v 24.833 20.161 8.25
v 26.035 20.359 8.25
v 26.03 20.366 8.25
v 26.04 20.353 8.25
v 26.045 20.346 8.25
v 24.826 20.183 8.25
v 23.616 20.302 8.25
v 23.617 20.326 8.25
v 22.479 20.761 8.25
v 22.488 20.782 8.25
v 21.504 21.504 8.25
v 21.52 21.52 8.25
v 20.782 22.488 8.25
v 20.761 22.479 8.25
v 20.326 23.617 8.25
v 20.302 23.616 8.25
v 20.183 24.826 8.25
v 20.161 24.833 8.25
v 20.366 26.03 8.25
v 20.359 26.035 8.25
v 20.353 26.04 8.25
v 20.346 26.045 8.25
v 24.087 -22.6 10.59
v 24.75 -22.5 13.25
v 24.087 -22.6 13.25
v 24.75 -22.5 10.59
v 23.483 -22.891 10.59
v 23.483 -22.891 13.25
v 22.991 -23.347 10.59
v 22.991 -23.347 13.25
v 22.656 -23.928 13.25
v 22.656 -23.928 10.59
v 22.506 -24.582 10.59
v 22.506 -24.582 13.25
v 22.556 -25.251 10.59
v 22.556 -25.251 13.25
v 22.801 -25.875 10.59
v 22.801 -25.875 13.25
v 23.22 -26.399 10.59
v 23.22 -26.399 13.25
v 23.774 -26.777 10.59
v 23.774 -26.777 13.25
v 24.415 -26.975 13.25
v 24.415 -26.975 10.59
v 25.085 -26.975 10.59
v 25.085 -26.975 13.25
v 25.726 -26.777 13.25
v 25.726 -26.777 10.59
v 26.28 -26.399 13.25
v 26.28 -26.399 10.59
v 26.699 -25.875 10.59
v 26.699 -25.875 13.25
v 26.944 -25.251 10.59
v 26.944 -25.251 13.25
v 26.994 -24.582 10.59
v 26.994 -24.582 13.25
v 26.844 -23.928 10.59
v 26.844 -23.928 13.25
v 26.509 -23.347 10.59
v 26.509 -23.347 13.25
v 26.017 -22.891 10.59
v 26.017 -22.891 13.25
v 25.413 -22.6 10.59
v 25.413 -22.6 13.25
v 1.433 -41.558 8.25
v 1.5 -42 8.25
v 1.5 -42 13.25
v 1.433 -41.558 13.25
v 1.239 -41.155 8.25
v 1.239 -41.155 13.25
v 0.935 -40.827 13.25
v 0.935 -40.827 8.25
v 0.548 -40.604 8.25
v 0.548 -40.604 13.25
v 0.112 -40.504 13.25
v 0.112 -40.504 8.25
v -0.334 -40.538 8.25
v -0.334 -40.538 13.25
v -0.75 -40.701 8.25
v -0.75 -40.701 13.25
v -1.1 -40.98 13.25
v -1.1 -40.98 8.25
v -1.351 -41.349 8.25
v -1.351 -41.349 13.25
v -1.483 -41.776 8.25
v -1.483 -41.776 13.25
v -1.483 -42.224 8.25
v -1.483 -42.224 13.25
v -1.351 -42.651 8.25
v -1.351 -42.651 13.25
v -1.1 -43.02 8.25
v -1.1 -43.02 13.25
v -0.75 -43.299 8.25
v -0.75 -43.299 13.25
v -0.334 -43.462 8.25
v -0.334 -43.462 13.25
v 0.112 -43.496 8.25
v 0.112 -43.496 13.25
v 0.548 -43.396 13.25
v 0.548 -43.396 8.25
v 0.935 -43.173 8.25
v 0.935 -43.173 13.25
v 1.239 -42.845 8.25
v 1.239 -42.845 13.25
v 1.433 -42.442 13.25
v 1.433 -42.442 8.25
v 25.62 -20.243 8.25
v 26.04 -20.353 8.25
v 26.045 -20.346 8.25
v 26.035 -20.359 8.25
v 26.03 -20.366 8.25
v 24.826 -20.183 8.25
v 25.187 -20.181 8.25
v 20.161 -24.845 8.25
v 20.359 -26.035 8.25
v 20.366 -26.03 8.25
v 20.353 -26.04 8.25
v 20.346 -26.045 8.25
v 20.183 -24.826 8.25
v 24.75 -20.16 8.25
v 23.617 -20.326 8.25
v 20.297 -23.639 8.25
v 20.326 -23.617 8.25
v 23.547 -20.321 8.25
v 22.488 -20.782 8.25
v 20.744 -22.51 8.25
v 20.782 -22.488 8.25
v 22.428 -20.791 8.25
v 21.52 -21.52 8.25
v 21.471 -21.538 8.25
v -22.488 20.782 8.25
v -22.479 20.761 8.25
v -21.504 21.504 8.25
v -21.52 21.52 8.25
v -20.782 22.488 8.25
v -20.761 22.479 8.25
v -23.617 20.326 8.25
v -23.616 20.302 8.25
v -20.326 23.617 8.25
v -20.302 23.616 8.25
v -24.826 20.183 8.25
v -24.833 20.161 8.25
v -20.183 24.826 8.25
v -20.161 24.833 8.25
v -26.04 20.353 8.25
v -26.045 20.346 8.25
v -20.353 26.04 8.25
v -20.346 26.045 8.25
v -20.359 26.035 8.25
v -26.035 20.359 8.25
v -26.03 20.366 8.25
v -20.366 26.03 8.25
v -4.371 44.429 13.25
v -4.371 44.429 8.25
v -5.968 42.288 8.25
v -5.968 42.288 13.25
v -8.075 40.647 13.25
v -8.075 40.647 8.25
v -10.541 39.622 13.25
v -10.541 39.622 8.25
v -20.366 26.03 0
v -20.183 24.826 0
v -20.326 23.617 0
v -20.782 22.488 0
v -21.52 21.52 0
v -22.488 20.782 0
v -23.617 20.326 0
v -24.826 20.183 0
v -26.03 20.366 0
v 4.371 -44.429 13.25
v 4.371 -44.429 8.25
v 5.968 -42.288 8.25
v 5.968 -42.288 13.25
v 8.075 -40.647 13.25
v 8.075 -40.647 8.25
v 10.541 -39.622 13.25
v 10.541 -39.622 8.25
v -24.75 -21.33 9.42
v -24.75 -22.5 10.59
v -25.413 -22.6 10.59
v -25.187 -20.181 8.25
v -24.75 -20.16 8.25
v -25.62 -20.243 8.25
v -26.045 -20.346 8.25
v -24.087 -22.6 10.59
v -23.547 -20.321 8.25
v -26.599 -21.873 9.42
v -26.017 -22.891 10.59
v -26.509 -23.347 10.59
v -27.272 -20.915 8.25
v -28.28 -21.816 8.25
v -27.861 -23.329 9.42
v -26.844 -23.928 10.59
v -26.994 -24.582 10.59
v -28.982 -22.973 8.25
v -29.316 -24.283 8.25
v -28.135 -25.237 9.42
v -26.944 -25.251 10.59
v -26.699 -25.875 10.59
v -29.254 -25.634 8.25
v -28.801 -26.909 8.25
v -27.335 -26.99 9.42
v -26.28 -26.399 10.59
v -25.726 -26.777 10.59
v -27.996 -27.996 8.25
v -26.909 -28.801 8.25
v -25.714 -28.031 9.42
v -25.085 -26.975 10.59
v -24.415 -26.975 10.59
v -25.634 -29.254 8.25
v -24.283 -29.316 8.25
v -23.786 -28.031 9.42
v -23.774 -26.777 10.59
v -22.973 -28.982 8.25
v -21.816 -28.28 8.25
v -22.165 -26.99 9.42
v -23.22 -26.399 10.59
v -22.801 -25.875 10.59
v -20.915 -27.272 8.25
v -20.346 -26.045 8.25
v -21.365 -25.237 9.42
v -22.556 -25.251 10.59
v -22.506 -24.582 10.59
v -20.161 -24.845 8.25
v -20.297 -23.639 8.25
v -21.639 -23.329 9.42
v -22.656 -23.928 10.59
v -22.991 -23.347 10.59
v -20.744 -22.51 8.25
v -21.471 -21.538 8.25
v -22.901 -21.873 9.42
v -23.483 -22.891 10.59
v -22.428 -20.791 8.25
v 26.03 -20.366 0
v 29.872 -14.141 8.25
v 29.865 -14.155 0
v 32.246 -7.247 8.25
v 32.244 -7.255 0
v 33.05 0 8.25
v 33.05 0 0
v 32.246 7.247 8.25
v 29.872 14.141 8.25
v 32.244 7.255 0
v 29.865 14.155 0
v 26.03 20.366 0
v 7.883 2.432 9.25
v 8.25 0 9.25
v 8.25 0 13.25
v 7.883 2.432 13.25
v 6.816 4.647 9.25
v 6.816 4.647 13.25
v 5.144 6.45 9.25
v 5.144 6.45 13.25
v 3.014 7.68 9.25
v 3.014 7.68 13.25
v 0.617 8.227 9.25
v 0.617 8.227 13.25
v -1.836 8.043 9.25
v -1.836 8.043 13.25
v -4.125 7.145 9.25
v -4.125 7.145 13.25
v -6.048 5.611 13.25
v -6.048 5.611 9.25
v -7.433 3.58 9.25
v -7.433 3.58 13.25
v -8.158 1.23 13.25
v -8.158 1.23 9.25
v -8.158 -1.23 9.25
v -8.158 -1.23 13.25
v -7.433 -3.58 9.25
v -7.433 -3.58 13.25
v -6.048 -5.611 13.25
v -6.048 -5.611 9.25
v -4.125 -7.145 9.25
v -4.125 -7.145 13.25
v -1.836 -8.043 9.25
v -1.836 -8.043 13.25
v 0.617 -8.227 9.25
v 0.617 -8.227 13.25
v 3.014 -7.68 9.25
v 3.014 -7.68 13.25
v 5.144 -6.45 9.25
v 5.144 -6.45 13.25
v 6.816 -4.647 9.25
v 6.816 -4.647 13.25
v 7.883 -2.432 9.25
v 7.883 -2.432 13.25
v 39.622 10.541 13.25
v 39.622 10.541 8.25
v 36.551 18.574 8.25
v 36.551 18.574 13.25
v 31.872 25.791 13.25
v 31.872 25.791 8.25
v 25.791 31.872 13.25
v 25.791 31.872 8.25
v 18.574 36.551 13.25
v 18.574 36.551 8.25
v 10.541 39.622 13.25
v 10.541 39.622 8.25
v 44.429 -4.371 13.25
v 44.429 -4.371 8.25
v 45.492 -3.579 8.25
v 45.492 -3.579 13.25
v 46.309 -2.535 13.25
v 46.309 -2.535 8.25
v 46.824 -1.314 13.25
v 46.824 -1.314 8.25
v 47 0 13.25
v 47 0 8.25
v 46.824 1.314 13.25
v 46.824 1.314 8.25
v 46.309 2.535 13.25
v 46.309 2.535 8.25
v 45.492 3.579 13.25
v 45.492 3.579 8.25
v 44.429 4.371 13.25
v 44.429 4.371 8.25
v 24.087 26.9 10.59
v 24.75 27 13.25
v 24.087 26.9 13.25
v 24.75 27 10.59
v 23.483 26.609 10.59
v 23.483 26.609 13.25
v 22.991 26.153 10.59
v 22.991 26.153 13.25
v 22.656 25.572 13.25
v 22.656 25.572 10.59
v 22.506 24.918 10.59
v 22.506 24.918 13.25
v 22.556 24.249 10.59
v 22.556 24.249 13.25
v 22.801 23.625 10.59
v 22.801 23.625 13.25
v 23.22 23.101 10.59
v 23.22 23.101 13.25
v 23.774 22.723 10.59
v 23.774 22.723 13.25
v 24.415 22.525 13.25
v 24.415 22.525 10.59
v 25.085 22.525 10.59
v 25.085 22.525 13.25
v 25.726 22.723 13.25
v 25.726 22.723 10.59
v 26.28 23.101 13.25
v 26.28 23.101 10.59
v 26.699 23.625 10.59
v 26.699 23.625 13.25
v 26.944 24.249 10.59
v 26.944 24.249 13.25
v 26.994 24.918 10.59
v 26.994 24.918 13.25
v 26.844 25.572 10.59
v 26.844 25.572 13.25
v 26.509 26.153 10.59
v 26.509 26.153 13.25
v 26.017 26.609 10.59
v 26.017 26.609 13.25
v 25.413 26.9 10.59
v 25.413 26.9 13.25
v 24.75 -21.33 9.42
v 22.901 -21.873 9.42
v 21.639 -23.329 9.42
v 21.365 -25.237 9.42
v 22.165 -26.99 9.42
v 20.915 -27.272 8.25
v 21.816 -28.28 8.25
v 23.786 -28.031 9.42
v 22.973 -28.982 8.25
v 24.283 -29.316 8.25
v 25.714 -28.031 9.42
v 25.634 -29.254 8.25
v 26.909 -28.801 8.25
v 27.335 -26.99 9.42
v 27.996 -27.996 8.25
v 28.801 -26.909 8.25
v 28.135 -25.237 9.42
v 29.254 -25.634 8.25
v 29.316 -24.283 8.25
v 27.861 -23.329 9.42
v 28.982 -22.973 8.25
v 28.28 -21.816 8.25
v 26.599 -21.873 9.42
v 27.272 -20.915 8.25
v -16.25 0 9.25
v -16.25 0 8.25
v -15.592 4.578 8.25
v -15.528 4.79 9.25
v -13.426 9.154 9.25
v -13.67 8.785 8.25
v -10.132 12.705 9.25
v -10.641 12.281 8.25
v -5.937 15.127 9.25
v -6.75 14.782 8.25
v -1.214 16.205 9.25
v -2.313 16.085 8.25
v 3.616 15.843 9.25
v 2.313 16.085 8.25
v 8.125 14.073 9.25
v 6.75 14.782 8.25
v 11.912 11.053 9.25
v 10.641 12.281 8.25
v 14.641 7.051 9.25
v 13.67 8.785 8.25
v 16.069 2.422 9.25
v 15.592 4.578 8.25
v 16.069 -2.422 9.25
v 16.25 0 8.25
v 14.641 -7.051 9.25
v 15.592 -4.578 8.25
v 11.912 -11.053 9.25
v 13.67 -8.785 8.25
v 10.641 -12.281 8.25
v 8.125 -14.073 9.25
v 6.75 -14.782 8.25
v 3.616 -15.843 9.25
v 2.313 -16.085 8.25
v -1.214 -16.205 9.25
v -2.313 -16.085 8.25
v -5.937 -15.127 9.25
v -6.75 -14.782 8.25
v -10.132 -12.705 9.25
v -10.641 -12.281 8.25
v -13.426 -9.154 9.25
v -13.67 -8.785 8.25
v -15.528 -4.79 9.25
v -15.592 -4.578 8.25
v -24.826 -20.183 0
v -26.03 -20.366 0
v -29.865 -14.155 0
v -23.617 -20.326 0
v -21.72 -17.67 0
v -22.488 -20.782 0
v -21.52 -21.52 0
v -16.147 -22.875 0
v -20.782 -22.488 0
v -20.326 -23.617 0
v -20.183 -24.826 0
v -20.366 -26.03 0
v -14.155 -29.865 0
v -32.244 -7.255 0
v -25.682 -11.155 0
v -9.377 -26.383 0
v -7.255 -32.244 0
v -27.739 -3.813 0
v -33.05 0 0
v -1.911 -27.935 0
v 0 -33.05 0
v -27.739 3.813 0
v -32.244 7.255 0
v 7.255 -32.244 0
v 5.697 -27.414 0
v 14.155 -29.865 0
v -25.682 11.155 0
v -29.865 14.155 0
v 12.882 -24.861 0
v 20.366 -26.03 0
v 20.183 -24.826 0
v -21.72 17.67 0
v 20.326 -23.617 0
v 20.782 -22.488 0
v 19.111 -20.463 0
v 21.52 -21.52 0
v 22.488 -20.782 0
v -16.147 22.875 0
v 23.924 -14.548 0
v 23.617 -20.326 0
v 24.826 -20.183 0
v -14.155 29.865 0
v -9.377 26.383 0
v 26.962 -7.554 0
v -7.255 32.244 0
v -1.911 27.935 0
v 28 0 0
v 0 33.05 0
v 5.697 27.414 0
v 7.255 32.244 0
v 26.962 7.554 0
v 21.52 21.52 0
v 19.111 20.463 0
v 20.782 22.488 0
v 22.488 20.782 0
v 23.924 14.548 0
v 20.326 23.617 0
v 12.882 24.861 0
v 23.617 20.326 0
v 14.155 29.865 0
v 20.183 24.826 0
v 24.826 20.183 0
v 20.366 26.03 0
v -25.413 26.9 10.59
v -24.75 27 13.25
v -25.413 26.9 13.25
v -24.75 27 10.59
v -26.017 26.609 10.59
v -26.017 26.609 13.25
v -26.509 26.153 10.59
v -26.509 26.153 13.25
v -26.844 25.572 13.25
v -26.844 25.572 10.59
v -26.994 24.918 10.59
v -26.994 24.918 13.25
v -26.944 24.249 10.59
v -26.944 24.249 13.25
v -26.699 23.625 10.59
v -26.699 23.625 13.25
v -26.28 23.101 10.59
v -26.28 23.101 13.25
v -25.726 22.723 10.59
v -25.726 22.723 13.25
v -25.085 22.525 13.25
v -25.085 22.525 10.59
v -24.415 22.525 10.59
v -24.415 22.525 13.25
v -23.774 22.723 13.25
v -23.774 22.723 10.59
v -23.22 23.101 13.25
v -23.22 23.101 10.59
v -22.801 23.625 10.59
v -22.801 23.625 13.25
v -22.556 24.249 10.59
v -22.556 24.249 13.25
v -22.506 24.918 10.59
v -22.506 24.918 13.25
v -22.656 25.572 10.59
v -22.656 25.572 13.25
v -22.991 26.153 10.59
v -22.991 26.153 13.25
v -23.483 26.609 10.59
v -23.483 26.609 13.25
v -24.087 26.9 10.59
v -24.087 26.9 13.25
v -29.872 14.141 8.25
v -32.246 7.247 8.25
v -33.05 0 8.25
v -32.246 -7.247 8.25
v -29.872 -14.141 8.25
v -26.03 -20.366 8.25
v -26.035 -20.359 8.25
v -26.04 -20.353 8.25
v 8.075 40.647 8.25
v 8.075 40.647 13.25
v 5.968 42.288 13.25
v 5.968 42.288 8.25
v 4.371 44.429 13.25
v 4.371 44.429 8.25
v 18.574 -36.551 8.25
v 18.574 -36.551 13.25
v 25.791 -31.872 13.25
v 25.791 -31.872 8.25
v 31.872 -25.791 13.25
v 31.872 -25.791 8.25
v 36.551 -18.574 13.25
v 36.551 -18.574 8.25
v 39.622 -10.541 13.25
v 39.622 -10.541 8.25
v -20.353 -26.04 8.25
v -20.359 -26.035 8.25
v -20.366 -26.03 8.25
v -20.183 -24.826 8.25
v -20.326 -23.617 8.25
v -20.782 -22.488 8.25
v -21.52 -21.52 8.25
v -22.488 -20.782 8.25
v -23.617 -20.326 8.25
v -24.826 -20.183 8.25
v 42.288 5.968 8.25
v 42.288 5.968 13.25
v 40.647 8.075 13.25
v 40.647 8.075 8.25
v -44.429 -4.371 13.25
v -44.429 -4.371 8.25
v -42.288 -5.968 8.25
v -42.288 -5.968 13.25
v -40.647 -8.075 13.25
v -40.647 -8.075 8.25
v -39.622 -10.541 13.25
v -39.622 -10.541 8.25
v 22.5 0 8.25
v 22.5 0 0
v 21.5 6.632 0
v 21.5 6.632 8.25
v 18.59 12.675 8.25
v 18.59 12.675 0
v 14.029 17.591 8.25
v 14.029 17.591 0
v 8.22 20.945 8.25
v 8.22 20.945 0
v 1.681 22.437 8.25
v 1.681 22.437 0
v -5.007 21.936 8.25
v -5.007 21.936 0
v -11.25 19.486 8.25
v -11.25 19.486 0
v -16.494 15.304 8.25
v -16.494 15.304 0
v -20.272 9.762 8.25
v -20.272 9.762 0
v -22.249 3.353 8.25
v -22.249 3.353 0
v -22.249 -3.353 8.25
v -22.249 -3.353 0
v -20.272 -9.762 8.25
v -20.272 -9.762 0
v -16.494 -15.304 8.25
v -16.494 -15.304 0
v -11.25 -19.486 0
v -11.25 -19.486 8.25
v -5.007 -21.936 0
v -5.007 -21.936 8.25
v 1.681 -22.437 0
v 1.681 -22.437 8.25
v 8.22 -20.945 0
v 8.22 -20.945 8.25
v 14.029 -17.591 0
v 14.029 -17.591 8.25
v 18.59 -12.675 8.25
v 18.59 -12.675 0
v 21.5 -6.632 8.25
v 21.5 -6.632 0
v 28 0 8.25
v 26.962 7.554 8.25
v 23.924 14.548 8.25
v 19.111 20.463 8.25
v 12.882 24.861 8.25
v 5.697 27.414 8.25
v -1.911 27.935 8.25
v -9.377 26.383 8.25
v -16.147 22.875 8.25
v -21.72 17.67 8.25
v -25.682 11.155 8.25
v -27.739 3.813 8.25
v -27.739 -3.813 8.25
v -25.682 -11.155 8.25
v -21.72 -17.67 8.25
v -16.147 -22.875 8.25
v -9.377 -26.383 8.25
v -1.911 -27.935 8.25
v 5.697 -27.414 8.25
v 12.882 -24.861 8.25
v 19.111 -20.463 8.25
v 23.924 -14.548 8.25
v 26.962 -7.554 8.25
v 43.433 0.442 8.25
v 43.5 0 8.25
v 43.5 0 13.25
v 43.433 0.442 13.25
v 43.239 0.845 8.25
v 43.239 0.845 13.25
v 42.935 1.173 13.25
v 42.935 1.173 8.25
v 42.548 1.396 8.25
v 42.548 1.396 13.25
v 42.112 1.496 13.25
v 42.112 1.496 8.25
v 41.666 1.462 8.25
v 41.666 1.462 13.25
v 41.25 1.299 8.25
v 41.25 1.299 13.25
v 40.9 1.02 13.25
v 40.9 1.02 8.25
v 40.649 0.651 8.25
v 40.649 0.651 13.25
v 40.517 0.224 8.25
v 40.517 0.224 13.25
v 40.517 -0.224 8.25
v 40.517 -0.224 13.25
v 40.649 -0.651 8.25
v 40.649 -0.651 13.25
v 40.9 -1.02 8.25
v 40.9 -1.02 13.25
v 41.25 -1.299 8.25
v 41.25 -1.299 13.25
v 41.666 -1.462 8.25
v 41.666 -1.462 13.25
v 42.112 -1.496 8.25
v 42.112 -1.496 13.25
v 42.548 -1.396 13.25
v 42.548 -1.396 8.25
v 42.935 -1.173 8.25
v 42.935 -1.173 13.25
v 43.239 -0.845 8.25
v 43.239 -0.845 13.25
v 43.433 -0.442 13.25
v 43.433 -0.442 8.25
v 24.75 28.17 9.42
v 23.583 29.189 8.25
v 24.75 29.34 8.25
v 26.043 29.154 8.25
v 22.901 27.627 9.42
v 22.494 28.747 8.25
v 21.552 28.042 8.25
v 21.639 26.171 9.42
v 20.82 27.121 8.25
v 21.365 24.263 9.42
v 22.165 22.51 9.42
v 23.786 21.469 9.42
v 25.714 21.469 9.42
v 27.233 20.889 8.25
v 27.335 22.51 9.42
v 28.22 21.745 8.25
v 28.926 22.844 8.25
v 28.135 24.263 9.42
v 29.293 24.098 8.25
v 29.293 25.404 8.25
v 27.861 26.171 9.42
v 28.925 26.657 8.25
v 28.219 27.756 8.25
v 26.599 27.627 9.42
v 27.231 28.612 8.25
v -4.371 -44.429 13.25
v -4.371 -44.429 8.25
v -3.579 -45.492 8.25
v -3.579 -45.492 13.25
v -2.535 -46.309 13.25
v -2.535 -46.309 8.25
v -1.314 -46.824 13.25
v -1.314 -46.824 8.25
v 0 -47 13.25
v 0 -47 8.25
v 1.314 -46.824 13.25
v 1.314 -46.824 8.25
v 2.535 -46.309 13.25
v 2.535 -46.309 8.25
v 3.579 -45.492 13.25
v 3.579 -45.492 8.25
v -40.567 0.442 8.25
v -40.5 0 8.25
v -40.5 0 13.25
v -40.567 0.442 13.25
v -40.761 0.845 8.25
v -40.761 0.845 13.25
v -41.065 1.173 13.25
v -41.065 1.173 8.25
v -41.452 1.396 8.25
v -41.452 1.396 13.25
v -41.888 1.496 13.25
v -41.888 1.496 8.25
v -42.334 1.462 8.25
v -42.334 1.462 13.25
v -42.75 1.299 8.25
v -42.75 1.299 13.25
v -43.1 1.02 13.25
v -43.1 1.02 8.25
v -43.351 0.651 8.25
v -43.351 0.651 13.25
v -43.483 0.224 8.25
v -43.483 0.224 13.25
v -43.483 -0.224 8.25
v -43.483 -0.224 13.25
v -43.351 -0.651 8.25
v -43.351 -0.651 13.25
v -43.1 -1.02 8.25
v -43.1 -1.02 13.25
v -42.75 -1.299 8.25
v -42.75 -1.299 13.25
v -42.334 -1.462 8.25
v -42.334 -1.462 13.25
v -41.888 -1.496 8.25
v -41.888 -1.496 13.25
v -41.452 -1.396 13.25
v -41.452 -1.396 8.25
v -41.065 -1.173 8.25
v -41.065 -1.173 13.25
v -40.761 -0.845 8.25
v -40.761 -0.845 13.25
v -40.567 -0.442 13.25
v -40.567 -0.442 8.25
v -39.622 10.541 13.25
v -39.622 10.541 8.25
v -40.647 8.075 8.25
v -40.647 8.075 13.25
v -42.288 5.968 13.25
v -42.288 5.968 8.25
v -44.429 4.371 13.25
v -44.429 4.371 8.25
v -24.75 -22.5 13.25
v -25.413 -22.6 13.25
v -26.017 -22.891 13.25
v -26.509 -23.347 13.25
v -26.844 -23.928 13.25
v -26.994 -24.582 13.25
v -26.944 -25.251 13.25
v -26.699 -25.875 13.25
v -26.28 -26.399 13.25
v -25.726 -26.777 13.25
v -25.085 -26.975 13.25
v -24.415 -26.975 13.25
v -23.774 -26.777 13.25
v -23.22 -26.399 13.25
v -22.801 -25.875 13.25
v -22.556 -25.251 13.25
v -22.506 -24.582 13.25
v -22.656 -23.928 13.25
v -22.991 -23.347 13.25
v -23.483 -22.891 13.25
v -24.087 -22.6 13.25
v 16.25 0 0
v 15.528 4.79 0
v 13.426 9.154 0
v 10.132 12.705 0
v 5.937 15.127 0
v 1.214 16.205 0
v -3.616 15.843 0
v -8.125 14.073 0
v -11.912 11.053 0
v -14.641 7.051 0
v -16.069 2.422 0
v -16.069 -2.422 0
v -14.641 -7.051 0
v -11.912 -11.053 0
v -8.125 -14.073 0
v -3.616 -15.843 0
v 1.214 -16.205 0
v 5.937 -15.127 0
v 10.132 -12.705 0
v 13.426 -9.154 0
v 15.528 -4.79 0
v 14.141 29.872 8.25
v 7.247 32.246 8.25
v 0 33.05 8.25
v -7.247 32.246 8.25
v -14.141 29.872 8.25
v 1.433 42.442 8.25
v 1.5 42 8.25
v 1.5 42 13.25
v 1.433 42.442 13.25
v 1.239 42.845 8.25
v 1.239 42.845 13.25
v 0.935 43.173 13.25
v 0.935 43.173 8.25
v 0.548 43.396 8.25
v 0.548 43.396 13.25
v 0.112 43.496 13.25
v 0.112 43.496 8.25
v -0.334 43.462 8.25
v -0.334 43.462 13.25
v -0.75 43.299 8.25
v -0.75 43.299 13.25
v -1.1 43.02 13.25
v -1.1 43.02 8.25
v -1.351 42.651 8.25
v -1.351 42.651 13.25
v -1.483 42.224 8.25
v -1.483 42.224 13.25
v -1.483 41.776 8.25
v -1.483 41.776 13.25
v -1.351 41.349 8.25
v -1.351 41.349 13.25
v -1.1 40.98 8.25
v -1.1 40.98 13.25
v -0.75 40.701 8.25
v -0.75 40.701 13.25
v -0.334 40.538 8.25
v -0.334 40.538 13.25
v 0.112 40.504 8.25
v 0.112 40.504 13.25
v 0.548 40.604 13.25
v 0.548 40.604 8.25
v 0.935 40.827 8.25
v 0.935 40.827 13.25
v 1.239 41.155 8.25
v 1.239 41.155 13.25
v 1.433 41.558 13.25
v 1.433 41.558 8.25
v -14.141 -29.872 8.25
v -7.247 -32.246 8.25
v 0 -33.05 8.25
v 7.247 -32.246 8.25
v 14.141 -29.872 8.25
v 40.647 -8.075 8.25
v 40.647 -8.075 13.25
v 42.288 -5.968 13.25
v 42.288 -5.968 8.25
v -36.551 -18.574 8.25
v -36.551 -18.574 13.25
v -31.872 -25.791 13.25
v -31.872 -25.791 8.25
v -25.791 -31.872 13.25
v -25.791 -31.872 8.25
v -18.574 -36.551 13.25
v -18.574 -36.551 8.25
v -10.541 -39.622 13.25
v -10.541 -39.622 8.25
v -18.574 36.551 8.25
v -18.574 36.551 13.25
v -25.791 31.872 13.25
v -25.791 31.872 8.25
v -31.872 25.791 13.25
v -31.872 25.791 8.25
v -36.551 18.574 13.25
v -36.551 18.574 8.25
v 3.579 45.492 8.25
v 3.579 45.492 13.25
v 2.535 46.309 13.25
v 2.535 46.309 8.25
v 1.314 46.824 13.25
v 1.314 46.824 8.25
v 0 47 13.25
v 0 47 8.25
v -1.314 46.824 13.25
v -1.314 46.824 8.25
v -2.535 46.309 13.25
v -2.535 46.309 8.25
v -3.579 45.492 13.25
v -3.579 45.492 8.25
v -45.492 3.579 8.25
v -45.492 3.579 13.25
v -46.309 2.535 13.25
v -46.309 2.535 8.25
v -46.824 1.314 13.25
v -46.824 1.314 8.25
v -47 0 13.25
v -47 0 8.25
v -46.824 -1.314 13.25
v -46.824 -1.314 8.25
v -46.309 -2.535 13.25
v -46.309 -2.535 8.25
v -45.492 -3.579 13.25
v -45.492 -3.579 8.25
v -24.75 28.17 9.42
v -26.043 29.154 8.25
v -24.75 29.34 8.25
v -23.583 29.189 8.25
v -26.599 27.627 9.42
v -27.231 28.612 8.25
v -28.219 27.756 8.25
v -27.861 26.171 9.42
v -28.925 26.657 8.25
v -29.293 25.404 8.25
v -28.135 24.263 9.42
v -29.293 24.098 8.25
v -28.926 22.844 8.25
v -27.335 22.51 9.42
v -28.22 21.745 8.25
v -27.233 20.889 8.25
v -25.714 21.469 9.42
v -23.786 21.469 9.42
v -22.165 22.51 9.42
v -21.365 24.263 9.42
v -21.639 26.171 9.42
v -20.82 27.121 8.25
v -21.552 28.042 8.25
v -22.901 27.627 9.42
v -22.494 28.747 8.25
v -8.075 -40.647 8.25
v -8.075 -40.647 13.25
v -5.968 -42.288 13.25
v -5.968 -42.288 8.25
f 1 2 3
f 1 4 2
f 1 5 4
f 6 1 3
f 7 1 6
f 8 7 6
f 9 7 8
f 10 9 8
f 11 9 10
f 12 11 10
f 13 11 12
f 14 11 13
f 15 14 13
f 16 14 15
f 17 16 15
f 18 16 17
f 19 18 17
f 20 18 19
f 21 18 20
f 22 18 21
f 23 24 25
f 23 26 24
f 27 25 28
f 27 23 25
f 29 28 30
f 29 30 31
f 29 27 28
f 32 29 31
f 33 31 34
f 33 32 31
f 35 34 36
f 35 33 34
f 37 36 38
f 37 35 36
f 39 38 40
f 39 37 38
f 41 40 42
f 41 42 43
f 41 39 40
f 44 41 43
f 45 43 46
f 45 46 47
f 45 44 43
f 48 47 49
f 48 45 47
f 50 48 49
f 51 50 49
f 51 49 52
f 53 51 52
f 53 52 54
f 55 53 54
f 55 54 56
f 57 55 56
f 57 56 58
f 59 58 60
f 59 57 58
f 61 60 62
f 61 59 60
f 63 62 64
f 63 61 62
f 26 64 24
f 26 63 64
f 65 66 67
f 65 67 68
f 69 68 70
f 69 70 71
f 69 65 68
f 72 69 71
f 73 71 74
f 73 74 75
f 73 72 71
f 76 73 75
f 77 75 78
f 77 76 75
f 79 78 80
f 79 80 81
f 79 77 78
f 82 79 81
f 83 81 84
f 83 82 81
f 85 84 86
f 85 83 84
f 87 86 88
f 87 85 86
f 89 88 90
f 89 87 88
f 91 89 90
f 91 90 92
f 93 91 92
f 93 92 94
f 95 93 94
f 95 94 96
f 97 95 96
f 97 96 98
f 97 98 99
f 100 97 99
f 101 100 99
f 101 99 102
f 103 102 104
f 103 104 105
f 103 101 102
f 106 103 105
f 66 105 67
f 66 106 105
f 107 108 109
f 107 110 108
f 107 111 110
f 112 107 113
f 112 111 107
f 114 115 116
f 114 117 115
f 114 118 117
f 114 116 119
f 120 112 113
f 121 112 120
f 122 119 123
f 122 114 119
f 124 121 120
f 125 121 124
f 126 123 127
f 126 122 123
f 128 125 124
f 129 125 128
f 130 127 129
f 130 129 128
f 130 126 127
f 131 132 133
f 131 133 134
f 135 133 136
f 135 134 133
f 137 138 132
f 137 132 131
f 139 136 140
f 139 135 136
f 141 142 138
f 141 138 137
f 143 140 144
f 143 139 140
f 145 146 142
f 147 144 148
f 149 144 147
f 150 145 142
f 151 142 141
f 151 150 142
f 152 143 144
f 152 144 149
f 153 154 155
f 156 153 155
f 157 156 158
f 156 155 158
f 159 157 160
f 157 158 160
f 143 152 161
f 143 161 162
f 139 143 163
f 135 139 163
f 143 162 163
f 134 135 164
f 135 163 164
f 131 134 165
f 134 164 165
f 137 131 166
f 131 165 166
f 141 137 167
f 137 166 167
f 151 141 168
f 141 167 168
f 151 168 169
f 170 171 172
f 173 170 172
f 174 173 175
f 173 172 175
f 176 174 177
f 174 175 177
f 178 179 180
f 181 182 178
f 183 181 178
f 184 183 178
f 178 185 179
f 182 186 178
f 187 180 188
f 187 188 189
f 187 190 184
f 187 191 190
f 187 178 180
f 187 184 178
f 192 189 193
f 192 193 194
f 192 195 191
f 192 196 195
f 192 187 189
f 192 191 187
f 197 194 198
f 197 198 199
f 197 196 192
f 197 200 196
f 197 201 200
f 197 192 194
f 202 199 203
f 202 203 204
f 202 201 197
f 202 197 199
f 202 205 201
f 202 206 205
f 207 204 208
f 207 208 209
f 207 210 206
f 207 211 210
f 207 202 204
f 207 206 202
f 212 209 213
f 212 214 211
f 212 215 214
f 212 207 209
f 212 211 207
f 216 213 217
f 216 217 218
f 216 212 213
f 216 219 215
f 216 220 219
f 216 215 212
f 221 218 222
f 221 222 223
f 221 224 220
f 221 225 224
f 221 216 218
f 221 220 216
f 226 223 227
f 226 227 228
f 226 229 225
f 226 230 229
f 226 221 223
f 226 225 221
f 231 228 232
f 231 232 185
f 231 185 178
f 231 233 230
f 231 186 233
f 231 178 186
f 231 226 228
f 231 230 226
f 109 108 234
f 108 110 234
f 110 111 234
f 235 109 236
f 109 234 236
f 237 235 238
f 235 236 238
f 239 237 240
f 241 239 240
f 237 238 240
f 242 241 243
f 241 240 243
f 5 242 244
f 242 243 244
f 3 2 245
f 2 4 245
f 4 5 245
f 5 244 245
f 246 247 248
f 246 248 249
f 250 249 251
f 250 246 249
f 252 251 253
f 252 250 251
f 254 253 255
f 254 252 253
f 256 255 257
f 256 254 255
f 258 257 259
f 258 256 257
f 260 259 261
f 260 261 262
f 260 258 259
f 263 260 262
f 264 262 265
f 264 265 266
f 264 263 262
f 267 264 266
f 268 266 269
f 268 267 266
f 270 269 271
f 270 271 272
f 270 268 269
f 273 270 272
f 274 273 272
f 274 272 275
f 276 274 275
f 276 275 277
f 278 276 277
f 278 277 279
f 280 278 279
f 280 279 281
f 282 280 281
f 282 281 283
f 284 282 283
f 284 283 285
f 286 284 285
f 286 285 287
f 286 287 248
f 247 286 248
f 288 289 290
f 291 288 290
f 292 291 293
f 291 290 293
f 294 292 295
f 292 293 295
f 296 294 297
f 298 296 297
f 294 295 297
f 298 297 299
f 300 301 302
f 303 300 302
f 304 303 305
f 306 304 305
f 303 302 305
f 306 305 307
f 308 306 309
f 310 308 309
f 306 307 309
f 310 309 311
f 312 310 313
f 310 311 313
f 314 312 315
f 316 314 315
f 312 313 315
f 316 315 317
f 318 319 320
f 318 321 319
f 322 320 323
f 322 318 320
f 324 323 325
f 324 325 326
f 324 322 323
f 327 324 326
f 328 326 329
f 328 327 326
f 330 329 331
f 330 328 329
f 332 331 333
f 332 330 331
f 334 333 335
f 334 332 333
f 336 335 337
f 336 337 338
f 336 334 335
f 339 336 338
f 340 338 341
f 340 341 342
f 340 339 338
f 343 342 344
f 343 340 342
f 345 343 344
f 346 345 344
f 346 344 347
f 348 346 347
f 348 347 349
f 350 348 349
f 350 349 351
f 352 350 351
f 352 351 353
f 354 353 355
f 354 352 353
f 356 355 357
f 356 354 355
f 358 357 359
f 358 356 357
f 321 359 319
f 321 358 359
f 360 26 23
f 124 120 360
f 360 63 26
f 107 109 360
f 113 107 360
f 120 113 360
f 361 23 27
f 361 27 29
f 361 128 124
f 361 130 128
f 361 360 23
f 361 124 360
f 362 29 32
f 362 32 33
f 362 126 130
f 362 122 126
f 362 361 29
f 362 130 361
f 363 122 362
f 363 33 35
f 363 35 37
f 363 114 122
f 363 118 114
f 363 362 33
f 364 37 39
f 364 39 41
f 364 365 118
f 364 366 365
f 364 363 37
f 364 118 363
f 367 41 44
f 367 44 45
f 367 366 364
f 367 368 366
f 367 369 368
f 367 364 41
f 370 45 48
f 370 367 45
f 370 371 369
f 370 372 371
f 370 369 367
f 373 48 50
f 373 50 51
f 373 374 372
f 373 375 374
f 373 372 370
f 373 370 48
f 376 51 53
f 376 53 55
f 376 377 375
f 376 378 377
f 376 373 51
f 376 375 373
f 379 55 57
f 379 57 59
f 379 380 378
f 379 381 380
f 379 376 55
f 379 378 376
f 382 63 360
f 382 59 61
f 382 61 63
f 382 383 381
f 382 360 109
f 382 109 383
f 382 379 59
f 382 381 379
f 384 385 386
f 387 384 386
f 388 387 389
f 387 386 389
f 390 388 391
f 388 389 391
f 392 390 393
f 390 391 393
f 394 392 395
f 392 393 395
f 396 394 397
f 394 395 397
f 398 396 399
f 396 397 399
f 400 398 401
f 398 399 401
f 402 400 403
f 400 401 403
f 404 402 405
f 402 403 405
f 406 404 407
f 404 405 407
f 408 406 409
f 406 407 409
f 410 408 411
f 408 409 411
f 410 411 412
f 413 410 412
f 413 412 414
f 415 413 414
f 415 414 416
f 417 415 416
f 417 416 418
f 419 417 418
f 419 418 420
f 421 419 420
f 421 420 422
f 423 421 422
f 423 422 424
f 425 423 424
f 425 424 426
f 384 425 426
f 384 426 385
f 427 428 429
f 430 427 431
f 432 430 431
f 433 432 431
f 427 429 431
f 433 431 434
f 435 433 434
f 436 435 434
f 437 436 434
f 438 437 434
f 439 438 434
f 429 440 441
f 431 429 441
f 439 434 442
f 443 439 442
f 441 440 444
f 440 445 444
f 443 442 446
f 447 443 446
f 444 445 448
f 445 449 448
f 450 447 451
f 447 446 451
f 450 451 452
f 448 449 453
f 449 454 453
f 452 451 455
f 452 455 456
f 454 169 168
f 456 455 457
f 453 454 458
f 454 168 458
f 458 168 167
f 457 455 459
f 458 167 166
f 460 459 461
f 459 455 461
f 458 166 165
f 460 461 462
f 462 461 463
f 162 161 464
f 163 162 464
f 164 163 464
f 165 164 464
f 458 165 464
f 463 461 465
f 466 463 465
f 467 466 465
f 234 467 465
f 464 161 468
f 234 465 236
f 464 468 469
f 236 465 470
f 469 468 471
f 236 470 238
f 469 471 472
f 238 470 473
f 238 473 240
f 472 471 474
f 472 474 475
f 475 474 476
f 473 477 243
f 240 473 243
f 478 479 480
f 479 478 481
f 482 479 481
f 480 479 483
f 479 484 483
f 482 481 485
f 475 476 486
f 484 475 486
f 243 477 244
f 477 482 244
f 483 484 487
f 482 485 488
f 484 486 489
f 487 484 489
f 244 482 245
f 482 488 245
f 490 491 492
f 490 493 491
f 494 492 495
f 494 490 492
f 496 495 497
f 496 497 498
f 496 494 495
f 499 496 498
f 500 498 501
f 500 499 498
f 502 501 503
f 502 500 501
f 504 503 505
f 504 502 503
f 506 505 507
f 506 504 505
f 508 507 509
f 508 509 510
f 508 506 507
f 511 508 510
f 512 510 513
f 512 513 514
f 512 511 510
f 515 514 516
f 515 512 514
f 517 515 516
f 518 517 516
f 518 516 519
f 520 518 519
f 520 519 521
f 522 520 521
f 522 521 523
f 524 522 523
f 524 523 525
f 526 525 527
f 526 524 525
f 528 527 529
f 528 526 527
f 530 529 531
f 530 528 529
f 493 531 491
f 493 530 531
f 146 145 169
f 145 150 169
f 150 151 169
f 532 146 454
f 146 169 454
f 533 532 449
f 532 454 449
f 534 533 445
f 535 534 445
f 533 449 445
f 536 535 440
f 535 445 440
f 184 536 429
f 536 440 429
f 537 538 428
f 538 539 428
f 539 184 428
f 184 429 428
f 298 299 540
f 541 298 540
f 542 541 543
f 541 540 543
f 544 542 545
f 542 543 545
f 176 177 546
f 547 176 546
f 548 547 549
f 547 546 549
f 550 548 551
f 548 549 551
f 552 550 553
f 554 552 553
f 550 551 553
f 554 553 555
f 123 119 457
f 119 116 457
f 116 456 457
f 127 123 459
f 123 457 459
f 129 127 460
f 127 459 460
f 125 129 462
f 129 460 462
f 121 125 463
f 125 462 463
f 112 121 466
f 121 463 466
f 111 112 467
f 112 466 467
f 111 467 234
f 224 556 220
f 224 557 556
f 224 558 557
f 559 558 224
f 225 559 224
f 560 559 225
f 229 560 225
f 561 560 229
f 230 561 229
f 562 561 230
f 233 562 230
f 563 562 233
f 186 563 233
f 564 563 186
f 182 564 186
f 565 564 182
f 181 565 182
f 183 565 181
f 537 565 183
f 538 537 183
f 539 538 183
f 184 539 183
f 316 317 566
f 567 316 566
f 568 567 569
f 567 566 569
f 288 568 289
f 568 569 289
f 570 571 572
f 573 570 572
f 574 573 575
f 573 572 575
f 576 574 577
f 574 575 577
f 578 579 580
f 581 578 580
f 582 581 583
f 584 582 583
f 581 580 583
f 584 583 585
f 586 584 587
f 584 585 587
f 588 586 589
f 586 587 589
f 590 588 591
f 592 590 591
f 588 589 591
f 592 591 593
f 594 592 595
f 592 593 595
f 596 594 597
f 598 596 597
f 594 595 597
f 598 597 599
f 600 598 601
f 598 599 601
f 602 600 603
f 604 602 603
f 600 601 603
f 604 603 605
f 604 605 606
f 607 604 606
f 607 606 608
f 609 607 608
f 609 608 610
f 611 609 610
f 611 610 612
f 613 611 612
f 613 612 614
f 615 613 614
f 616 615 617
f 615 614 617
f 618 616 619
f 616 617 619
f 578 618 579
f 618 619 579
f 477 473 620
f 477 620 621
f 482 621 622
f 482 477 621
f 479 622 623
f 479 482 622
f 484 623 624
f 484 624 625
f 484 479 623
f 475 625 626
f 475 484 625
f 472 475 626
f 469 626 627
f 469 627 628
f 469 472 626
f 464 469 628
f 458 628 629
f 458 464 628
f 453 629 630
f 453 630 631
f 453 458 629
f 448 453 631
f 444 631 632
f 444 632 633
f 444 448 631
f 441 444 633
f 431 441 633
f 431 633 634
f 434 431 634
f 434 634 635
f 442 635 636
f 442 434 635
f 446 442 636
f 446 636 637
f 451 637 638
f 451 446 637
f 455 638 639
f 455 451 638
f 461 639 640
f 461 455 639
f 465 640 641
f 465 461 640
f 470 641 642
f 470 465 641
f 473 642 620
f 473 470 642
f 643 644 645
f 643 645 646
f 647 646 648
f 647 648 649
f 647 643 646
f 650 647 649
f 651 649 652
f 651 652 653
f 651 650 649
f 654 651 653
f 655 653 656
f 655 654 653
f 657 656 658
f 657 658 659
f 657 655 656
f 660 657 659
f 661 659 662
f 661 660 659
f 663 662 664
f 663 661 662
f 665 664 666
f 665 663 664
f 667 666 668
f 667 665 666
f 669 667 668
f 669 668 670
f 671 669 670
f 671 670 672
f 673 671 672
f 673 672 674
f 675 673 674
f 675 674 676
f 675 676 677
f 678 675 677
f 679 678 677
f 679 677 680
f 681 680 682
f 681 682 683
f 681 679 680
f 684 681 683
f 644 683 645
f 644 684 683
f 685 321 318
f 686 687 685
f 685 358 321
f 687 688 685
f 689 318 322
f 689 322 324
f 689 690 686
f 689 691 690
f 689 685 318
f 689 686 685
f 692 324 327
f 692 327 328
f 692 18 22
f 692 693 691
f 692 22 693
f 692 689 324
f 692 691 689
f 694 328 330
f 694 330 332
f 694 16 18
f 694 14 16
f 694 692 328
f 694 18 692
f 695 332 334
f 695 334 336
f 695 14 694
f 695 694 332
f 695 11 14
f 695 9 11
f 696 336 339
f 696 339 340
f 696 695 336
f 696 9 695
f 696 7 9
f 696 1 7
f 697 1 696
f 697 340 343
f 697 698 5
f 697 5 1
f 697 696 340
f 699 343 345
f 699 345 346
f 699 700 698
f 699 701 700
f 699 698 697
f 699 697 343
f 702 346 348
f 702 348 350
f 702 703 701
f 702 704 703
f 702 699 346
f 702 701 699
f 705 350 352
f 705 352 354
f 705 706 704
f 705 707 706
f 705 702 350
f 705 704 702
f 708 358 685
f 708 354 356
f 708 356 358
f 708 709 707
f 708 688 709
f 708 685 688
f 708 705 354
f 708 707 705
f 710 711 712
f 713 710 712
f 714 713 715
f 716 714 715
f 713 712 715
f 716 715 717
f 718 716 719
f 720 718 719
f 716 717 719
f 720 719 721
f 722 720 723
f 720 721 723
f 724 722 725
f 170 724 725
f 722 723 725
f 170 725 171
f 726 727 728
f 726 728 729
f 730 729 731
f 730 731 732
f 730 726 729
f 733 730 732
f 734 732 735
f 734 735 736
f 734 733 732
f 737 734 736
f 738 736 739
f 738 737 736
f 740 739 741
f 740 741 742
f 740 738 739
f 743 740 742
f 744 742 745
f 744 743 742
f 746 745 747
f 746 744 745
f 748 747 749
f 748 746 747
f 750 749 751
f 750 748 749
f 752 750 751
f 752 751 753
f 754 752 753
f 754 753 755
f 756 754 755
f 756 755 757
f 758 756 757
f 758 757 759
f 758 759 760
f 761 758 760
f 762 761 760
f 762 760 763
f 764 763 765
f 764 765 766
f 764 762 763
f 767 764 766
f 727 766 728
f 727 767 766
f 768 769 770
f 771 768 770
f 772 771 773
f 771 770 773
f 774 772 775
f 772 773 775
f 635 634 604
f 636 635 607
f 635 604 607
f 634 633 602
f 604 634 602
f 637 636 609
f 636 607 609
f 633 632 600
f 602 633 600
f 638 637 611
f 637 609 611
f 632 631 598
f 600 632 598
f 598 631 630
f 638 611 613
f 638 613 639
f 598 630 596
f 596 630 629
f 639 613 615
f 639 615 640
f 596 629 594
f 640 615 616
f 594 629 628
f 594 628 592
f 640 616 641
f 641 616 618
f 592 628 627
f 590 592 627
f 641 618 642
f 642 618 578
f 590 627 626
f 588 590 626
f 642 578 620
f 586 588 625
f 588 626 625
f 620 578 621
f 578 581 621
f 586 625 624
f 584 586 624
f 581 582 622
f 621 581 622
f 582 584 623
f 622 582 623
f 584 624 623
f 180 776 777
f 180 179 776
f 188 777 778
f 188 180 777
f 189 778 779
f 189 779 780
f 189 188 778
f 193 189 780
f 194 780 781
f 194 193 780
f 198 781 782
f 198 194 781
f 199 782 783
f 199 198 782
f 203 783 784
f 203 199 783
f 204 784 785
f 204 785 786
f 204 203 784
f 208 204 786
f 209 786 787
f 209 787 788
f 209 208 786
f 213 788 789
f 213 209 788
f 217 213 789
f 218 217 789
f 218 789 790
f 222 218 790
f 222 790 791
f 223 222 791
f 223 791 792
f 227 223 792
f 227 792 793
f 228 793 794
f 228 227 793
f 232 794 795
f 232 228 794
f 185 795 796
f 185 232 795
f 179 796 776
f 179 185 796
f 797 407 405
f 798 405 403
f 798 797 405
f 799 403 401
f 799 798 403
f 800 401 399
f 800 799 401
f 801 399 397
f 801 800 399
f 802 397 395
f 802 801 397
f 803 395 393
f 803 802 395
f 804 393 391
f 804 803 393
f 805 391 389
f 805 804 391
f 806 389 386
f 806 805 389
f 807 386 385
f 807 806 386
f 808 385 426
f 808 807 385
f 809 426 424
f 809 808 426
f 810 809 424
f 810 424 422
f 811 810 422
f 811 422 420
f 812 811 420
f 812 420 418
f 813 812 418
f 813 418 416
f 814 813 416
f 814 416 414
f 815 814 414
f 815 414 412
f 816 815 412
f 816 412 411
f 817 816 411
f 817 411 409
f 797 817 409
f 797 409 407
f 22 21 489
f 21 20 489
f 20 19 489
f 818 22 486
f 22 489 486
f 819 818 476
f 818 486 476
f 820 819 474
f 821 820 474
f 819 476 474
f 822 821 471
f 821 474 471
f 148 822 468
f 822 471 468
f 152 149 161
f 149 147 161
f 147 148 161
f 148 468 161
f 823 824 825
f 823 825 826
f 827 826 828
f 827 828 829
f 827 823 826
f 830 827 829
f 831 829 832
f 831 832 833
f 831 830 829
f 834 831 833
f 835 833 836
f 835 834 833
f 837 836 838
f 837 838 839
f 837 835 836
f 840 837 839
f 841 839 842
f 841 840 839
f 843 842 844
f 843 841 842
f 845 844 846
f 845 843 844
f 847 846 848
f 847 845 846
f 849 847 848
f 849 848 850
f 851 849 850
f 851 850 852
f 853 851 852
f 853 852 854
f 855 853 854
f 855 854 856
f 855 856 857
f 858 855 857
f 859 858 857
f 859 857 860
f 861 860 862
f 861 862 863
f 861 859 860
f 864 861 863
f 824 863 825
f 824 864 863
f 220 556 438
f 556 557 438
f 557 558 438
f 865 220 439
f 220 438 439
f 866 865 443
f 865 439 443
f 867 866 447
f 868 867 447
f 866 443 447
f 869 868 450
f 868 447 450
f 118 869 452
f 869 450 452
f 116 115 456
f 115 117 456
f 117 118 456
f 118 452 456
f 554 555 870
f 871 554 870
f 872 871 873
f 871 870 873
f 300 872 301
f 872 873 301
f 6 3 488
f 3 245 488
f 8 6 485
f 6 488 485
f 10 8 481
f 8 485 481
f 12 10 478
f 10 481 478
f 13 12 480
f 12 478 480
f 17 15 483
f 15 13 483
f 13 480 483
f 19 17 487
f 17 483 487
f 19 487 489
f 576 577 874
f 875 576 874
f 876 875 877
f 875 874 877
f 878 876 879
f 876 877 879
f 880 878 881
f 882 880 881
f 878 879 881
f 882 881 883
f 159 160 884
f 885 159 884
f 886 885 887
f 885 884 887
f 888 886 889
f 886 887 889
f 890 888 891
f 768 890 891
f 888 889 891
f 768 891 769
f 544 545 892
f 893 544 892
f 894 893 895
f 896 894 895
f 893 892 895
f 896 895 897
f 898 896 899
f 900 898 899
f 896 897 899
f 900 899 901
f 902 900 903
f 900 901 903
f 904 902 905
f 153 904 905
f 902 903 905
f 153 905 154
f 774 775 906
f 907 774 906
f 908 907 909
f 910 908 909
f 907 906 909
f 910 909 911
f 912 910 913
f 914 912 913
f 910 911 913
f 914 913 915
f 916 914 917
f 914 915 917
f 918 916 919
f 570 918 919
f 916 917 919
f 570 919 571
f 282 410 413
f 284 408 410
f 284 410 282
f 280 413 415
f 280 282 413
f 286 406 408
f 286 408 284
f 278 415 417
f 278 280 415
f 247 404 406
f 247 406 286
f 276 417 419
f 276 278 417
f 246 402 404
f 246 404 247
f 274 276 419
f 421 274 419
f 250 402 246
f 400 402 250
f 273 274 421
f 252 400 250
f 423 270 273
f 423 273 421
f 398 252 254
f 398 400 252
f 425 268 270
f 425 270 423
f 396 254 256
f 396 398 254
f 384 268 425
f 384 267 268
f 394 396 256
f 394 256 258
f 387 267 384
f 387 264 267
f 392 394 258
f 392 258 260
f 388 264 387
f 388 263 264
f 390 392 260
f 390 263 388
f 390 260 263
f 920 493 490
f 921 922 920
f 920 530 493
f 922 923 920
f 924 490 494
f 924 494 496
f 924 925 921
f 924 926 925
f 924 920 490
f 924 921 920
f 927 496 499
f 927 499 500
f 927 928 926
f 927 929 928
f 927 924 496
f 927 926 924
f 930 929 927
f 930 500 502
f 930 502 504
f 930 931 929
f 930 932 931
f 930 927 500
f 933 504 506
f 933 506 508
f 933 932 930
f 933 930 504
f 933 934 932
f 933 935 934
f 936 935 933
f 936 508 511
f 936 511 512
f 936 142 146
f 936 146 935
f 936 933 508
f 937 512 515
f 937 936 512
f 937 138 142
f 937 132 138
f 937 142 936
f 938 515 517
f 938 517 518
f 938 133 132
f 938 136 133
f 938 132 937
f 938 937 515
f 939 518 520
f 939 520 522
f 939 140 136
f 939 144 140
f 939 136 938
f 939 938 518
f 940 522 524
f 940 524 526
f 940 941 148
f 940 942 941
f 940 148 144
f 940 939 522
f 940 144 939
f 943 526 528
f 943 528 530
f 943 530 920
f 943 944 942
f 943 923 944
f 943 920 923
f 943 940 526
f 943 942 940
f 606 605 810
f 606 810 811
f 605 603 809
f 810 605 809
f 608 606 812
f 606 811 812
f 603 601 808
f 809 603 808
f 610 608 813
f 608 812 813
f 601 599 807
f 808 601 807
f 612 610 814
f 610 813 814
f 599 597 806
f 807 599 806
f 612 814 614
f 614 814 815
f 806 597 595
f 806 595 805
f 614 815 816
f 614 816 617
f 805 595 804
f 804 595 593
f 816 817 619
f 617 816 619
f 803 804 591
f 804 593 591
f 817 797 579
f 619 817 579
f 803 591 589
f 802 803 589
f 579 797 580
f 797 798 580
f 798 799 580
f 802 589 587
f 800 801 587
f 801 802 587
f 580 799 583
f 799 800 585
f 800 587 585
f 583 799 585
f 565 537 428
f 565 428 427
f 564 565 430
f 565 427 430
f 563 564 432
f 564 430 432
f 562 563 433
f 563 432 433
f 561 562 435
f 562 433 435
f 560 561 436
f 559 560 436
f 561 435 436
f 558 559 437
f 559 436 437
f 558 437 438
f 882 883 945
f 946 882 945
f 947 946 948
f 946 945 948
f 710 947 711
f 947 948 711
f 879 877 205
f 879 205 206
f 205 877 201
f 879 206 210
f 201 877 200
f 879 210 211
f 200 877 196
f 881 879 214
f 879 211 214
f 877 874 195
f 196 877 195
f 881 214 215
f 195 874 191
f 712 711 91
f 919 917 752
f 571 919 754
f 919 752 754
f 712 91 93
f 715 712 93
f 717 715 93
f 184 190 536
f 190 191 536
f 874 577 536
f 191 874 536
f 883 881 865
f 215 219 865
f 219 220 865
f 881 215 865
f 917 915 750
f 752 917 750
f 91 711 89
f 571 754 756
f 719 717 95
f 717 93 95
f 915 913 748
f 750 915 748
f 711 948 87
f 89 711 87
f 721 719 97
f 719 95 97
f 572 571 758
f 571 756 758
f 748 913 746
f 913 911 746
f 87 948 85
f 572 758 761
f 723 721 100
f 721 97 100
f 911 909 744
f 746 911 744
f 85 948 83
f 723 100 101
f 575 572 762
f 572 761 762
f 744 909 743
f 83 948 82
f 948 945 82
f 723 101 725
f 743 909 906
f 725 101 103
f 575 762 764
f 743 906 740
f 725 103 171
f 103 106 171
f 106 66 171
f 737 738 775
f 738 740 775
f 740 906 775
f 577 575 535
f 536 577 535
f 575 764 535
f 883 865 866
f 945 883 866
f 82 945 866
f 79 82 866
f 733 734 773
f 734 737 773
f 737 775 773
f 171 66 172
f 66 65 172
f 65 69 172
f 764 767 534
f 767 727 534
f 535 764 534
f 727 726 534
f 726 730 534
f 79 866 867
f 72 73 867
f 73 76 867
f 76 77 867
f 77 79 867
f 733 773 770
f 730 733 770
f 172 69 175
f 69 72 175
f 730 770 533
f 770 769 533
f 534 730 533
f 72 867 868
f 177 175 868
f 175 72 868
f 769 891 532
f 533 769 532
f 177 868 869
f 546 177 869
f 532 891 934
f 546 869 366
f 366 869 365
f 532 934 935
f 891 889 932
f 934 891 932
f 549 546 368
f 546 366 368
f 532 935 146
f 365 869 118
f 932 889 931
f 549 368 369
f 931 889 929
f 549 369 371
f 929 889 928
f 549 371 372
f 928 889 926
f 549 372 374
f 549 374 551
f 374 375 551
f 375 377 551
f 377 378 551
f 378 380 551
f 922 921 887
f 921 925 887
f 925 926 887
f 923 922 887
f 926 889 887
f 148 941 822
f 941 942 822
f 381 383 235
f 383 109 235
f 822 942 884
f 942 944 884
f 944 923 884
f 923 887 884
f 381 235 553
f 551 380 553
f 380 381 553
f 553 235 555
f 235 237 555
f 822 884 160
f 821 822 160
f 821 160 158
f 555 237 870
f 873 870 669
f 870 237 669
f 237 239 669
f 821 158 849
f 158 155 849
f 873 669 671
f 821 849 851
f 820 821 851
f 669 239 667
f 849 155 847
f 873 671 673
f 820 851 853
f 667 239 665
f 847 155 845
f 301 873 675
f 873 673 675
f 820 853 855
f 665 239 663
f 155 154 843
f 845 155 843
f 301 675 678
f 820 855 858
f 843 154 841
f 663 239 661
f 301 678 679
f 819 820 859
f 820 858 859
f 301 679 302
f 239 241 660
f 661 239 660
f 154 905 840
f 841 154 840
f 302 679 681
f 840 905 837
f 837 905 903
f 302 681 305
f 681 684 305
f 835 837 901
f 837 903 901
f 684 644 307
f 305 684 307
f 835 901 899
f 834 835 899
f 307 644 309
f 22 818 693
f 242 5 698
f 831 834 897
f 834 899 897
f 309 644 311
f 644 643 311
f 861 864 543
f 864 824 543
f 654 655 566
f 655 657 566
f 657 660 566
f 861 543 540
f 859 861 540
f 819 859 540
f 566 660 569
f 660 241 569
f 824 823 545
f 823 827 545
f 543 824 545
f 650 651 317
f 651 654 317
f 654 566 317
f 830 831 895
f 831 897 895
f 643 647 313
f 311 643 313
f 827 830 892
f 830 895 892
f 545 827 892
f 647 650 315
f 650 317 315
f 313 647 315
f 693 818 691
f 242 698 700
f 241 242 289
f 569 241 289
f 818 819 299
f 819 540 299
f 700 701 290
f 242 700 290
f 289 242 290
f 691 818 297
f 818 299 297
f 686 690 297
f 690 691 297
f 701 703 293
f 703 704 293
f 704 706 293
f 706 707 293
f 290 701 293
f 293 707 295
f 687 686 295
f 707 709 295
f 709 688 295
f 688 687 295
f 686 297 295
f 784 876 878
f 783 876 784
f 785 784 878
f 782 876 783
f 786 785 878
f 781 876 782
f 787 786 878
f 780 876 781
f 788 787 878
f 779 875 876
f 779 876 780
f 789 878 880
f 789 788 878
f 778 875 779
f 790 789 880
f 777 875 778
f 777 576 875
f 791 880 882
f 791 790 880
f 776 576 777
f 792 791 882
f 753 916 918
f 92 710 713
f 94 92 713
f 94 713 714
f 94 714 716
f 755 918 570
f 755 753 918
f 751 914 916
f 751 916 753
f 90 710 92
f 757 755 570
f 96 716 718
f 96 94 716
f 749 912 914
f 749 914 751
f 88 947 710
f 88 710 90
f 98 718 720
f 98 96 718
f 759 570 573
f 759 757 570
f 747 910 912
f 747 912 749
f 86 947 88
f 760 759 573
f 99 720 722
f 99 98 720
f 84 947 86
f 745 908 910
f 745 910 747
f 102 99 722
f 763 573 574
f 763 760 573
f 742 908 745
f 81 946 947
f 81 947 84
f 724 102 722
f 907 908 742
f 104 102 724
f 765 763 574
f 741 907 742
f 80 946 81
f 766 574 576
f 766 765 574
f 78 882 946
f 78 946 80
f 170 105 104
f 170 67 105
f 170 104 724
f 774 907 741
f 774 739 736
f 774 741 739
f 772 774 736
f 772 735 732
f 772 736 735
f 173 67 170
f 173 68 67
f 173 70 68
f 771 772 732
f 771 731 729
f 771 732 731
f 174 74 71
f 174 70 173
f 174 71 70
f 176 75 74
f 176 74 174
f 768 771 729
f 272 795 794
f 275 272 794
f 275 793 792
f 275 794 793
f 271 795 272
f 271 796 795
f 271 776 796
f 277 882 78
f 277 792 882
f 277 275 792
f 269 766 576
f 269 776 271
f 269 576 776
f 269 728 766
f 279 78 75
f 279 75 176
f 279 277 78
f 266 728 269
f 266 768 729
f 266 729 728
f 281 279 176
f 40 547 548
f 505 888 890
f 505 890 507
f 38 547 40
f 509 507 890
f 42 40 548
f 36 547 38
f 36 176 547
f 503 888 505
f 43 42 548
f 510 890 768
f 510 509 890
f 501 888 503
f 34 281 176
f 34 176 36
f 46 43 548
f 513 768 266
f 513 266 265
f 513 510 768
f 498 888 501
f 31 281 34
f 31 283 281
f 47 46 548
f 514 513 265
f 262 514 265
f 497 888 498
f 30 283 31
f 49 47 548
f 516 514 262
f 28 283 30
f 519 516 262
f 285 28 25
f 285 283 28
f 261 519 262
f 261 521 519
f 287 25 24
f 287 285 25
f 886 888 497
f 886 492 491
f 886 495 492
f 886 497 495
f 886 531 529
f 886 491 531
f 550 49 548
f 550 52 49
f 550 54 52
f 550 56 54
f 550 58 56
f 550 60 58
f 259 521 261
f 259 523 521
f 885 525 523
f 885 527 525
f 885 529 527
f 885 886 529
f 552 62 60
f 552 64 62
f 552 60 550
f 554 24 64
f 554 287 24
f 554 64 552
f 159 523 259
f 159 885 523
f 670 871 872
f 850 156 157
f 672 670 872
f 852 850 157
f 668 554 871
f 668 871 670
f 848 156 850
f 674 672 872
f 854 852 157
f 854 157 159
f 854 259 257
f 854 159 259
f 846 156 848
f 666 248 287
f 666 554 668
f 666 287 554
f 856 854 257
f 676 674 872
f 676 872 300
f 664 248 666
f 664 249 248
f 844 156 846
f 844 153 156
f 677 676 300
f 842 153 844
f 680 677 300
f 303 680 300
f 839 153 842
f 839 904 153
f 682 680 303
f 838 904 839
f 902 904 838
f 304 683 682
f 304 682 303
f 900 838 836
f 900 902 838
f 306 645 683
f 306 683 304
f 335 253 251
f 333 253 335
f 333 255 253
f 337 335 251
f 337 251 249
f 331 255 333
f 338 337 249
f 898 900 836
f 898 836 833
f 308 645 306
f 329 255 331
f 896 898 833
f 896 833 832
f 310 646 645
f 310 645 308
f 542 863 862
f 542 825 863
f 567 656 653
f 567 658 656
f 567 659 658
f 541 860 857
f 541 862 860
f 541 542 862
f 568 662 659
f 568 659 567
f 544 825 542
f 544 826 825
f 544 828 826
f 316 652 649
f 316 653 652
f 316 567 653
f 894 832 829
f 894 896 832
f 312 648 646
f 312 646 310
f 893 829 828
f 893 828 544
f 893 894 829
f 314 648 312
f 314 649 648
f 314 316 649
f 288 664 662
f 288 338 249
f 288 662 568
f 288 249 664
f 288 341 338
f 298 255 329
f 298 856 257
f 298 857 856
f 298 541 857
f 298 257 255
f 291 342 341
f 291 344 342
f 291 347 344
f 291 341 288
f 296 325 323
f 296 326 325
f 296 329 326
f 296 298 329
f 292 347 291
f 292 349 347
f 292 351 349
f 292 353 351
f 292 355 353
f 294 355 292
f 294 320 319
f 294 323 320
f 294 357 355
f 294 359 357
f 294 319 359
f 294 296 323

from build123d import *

# Parameters (mm, degrees)
IZIM1_R                                    = 22.5
IZIM1_R_2                                  = 16.25
Y_KSEKLIK_EKSTR_ZYON1_DEPTH                = 8.25
IZIM1_R_3                                  = 33.05
IZIM1_R_4                                  = 28
Y_KSEKLIK_EKSTR_ZYON1_2_DEPTH              = 8.25
IZIM2_R                                    = 2
IZIM2_R_2                                  = 1.5
IZIM2_R_3                                  = 8.25
Y_KSEKLIK_EKSTR_ZYON2_DEPTH                = 5
M4_ALT_GEN_ALYAN_HAV_A_BA_L_VIDA_I_2_COUNT = 2
M4_ALT_GEN_ALYAN_HAV_A_BA_L_VIDA_I_2_PITCH = 49.5
M4_ALT_GEN_ALYAN_HAV_A_BA_L_VIDA_I_3_COUNT = 2
M4_ALT_GEN_ALYAN_HAV_A_BA_L_VIDA_I_3_PITCH = 70.003571337
M4_ALT_GEN_ALYAN_HAV_A_BA_L_VIDA_I_4_COUNT = 2
M4_ALT_GEN_ALYAN_HAV_A_BA_L_VIDA_I_4_PITCH = 49.5
IZIM7_R                                    = 16.25
KES_EKSTR_ZYON2_DEPTH                      = 1
IZIM8_R                                    = 4.567222976
KES_EKSTR_ZYON3_DEPTH                      = 8.25


with BuildPart() as part:
    # Çizim1 → Yükseklik-Ekstrüzyon1 (new body)
    with BuildSketch(Plane.XY):
        Circle(IZIM1_R)
        Circle(IZIM1_R_2, mode=Mode.SUBTRACT)
    extrude(amount=Y_KSEKLIK_EKSTR_ZYON1_DEPTH)



with BuildPart() as body_2:
    # Çizim1 → Y_kseklik-Ekstr_zyon1 2 (new body)
    with BuildSketch(Plane.XY):
        Circle(IZIM1_R_3)
        Circle(IZIM1_R_4, mode=Mode.SUBTRACT)
    extrude(amount=Y_KSEKLIK_EKSTR_ZYON1_2_DEPTH)


with BuildPart() as part_1:
    add(part.part)

    add(body_2.part)  # Yükseklik-Ekstrüzyon2 merges body 2
    # Çizim2 → Yükseklik-Ekstrüzyon2 (add)
    with BuildSketch(Plane.XY.offset(8.25)):
        with BuildLine():
            ThreePointArc((-10.540830255, 39.621848739), (-28.991378029, 28.991378029), (-39.621848739, 10.540830255))
            ThreePointArc((-39.621848739, 10.540830255), (-41.396931543, 6.966269622), (-44.428571429, 4.370588155))
            ThreePointArc((-44.428571429, 4.370588155), (-47, 0), (-44.428571429, -4.370588155))
            ThreePointArc((-44.428571429, -4.370588155), (-41.396931543, -6.966269622), (-39.621848739, -10.540830255))
            ThreePointArc((-39.621848739, -10.540830255), (-28.991378029, -28.991378029), (-10.540830255, -39.621848739))
            ThreePointArc((-10.540830255, -39.621848739), (-6.966269622, -41.396931543), (-4.370588155, -44.428571429))
            ThreePointArc((-4.370588155, -44.428571429), (0, -47), (4.370588155, -44.428571429))
            ThreePointArc((4.370588155, -44.428571429), (6.966269622, -41.396931543), (10.540830255, -39.621848739))
            ThreePointArc((10.540830255, -39.621848739), (28.991378029, -28.991378029), (39.621848739, -10.540830255))
            ThreePointArc((39.621848739, -10.540830255), (41.396931543, -6.966269622), (44.428571429, -4.370588155))
            ThreePointArc((44.428571429, -4.370588155), (47, 0), (44.428571429, 4.370588155))
            ThreePointArc((44.428571429, 4.370588155), (41.396931543, 6.966269622), (39.621848739, 10.540830255))
            ThreePointArc((39.621848739, 10.540830255), (28.991378029, 28.991378029), (10.540830255, 39.621848739))
            ThreePointArc((10.540830255, 39.621848739), (6.966269622, 41.396931543), (4.370588155, 44.428571429))
            ThreePointArc((4.370588155, 44.428571429), (0, 47), (-4.370588155, 44.428571429))
            ThreePointArc((-4.370588155, 44.428571429), (-6.966269622, 41.396931543), (-10.540830255, 39.621848739))
        make_face()
        with Locations(Location((-24.75, 24.75, 0), (0, 0, 302.756106046))):
            Circle(IZIM2_R, mode=Mode.SUBTRACT)
        with Locations(Location((24.75, 24.75, 0), (0, 0, 212.756106046))):
            Circle(IZIM2_R, mode=Mode.SUBTRACT)
        with Locations(Location((24.75, -24.75, 0), (0, 0, 147.243893954))):
            Circle(IZIM2_R, mode=Mode.SUBTRACT)
        with Locations(Location((-24.75, -24.75, 0), (0, 0, 57.243893954))):
            Circle(IZIM2_R, mode=Mode.SUBTRACT)
        with Locations((0, 42)):
            Circle(IZIM2_R_2, mode=Mode.SUBTRACT)
        with Locations((42, 0)):
            Circle(IZIM2_R_2, mode=Mode.SUBTRACT)
        with Locations((0, -42)):
            Circle(IZIM2_R_2, mode=Mode.SUBTRACT)
        with Locations((-42, 0)):
            Circle(IZIM2_R_2, mode=Mode.SUBTRACT)
        Circle(IZIM2_R_3, mode=Mode.SUBTRACT)
    extrude(amount=Y_KSEKLIK_EKSTR_ZYON2_DEPTH)

    # Çizim5 → M4 Altıgen Alyan Havşa Başlı Vida İçin Havşa2 (revolve, cut)
    with BuildSketch(Plane(origin=(24.75, 24.75, 8.25), x_dir=(0, 1, 0), z_dir=(1, 0, 0))):
        Polygon((0, 0), (0, 5), (2.25, 5), (2.25, 2.34), (4.59, 0), align=None)
    m4_alt_gen_alyan_hav_a_ba_l_vida_in_ha = revolve(axis=Axis((24.75, 24.75, 1.9), (0, 0, 1)), mode=Mode.SUBTRACT)

    # M4 Alt_gen Alyan Hav_a Ba_l_ Vida _i 2: M4 Altıgen Alyan Havşa Başlı Vida İçin Havşa2 ×2
    with Locations(*[(-i * M4_ALT_GEN_ALYAN_HAV_A_BA_L_VIDA_I_2_PITCH, 0, 0) for i in range(1, M4_ALT_GEN_ALYAN_HAV_A_BA_L_VIDA_I_2_COUNT)]):
        add(m4_alt_gen_alyan_hav_a_ba_l_vida_in_ha, mode=Mode.SUBTRACT)

    # M4 Alt_gen Alyan Hav_a Ba_l_ Vida _i 3: M4 Altıgen Alyan Havşa Başlı Vida İçin Havşa2 ×2
    with Locations(*[Vector(-0.7071067811865475, -0.7071067811865476, 0) * (i * M4_ALT_GEN_ALYAN_HAV_A_BA_L_VIDA_I_3_PITCH) for i in range(1, M4_ALT_GEN_ALYAN_HAV_A_BA_L_VIDA_I_3_COUNT)]):
        add(m4_alt_gen_alyan_hav_a_ba_l_vida_in_ha, mode=Mode.SUBTRACT)

    # M4 Alt_gen Alyan Hav_a Ba_l_ Vida _i 4: M4 Altıgen Alyan Havşa Başlı Vida İçin Havşa2 ×2
    with Locations(*[(0, -i * M4_ALT_GEN_ALYAN_HAV_A_BA_L_VIDA_I_4_PITCH, 0) for i in range(1, M4_ALT_GEN_ALYAN_HAV_A_BA_L_VIDA_I_4_COUNT)]):
        add(m4_alt_gen_alyan_hav_a_ba_l_vida_in_ha, mode=Mode.SUBTRACT)

    # Çizim7 → Kes-Ekstrüzyon2 (cut)
    with BuildSketch(Plane(origin=(0, 0, 8.25), x_dir=(-1, 0, 0), z_dir=(0, 0, -1))):
        Circle(IZIM7_R)
    extrude(amount=-KES_EKSTR_ZYON2_DEPTH, mode=Mode.SUBTRACT)

    # Çizim8 → Kes-Ekstrüzyon3 (cut)
    with BuildSketch(Plane(origin=(0, 0, 0), x_dir=(-1, 0, 0), z_dir=(0, 0, -1))):
        with Locations((-24.75, 24.75)):
            Circle(IZIM8_R)
        with Locations((24.75, 24.75)):
            Circle(IZIM8_R)
        with Locations((24.75, -24.75)):
            Circle(IZIM8_R)
        with Locations((-24.75, -24.75)):
            Circle(IZIM8_R)
    extrude(amount=-KES_EKSTR_ZYON3_DEPTH, mode=Mode.SUBTRACT)


solid = part_1.part
